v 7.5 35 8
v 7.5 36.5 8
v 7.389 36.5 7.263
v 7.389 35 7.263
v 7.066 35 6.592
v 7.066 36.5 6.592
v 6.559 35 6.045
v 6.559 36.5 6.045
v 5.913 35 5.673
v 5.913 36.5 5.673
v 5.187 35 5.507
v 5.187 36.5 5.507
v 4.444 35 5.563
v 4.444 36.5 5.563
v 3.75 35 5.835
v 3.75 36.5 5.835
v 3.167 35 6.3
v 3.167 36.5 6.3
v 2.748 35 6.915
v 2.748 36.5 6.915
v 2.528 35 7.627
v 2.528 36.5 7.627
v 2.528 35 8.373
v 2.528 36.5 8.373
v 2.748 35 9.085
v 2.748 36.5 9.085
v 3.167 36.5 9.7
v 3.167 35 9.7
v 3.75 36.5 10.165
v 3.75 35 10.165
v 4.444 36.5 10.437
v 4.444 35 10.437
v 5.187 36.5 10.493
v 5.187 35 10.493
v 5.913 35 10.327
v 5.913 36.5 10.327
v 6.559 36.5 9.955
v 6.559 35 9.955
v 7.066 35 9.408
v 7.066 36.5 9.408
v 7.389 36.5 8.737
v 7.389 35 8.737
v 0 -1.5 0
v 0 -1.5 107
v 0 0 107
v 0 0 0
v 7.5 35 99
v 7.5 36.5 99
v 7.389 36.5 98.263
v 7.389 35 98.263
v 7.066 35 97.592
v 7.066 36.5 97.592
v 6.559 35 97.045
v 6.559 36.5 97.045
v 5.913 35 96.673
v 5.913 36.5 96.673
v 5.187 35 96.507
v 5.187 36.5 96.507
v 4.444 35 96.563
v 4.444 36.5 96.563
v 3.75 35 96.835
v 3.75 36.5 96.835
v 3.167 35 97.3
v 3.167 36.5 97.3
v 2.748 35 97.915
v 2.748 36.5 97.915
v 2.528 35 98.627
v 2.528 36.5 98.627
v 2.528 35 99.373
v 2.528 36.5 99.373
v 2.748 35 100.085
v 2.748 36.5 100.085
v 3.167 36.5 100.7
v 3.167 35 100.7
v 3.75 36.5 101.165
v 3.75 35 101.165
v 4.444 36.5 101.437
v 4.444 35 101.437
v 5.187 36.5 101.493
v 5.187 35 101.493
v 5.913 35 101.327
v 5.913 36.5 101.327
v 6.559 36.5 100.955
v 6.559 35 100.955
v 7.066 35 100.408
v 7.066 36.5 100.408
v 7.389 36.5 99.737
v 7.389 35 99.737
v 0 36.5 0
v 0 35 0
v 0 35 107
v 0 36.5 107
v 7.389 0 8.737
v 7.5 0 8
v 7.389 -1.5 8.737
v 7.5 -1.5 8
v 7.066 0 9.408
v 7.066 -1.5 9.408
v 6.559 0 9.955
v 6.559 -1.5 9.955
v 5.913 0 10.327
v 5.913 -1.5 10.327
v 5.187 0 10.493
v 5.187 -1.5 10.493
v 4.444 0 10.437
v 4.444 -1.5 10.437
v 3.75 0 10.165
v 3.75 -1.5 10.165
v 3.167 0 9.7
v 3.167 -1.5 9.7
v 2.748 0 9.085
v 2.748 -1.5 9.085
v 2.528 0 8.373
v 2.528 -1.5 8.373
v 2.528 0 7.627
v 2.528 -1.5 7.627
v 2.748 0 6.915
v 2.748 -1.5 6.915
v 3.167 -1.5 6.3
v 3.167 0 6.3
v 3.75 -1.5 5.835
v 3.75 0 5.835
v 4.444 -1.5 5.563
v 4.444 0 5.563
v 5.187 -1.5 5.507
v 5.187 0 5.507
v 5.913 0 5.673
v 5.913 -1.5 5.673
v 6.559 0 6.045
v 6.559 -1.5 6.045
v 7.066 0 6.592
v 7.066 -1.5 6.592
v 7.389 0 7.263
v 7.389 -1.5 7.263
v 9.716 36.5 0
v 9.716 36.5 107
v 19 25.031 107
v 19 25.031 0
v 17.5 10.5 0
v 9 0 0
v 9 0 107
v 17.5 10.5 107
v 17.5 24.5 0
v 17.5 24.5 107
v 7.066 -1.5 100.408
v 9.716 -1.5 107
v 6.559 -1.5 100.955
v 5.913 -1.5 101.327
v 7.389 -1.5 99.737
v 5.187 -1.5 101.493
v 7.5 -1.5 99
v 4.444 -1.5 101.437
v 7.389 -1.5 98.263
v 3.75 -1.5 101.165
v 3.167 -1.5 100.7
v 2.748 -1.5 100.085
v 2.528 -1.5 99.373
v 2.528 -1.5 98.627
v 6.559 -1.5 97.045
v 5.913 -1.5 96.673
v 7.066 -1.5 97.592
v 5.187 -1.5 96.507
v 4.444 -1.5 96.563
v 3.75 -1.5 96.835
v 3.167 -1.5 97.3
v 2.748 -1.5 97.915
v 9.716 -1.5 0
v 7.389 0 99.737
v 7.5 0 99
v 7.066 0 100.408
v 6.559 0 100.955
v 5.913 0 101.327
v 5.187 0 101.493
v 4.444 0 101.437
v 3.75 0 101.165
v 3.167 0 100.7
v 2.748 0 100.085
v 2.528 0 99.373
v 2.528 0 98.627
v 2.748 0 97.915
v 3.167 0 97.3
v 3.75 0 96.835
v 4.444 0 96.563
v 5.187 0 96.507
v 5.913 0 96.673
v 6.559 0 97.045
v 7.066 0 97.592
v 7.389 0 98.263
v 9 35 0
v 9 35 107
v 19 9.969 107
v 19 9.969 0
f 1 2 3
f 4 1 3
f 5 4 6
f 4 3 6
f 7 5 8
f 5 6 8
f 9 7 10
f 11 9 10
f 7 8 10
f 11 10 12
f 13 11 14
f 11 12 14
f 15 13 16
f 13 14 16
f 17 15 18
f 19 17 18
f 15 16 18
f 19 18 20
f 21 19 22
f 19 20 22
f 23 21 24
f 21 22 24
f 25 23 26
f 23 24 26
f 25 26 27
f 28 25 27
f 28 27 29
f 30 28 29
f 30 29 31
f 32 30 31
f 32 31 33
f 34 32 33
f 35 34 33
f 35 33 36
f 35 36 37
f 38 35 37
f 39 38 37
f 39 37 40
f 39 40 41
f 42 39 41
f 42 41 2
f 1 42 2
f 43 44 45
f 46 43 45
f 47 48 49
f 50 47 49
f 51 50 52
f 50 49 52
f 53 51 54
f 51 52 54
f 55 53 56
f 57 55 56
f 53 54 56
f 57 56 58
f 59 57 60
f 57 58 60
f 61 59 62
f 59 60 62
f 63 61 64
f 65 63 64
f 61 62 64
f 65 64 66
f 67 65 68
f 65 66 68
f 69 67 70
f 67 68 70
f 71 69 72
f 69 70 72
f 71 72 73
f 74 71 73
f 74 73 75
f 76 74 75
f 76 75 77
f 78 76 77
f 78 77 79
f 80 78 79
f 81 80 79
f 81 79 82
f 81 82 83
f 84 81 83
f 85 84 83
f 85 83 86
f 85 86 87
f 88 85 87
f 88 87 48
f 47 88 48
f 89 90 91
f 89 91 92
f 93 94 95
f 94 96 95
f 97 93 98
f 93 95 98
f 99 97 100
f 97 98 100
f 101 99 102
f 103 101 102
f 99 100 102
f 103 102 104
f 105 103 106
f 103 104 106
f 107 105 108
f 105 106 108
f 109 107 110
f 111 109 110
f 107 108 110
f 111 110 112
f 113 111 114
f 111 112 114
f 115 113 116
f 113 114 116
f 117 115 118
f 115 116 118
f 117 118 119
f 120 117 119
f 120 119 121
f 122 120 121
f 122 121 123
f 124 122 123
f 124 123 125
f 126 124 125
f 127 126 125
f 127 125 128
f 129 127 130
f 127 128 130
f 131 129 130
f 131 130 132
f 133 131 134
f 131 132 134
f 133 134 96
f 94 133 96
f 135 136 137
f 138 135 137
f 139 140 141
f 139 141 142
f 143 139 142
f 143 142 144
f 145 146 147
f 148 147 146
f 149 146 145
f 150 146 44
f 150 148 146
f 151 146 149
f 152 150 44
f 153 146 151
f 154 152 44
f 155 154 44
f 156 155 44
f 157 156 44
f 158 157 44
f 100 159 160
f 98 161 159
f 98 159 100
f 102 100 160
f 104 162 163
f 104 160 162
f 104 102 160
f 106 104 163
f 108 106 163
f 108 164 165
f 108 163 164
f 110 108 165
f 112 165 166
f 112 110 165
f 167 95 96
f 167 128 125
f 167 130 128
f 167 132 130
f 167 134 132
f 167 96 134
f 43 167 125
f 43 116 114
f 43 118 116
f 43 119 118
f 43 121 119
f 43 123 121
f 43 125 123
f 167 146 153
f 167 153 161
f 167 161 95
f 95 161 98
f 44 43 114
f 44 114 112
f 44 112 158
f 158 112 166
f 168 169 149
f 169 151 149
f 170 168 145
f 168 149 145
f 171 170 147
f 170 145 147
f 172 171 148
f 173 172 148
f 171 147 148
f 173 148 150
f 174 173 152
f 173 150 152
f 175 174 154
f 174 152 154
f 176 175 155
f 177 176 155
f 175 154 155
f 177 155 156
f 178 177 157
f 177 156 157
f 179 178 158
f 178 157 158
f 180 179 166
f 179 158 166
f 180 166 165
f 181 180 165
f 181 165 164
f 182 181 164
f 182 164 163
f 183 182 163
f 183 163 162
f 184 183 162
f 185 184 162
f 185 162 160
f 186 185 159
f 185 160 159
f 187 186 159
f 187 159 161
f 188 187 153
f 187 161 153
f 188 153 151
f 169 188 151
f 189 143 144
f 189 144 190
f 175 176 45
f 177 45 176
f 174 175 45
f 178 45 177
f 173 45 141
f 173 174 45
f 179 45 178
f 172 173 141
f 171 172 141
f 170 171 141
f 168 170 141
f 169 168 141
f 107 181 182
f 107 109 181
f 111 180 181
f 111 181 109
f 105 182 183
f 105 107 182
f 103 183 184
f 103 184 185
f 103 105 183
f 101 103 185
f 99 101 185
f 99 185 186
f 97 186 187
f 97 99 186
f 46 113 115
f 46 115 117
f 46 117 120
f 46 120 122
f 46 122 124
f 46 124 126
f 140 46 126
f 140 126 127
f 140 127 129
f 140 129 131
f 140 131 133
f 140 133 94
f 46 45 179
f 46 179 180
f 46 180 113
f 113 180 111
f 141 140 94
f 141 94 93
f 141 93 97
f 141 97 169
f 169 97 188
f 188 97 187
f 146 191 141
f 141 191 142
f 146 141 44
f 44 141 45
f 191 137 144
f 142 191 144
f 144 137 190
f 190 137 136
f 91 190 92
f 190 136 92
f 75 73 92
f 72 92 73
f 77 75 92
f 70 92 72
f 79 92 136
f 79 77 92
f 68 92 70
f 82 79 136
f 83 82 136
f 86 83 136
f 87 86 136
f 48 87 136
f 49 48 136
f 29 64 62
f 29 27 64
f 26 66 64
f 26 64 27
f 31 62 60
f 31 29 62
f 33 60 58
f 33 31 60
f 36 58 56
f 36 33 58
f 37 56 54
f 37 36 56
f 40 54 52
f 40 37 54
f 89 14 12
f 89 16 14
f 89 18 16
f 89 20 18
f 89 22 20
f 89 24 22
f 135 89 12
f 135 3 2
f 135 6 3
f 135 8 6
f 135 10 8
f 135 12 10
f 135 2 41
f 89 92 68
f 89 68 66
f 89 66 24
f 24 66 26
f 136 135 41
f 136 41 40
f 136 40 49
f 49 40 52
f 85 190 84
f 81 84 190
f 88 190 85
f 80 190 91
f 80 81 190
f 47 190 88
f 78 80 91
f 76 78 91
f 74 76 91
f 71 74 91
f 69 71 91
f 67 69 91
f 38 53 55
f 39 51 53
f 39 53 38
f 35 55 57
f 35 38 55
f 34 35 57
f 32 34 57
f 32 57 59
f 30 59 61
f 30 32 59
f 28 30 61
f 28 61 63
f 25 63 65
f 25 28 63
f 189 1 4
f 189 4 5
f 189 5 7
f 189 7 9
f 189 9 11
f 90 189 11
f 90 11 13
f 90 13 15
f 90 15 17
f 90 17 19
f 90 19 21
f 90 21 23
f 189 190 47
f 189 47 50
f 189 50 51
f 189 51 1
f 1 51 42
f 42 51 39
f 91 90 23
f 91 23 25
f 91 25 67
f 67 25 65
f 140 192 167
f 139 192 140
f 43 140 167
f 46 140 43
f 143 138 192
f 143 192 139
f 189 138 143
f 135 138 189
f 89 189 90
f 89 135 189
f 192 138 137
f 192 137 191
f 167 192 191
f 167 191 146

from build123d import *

# Parameters (mm, degrees)
SALIENTE_EXTRUIR1_DEPTH = 107
CORTAR_EXTRUIR1_REACH   = 40
CROQUIS3_R              = 2.5
CORTAR_EXTRUIR2_REACH   = 40
CROQUIS4_R              = 2.5


with BuildPart() as part:
    # Croquis1 → Saliente-Extruir1 (new body)
    with BuildSketch(Plane.XY):
        Polygon((0, 0), (9, 0), (17.5, 10.5), (17.5, 24.5), (9, 35), (0, 35), (0, 36.5), (9.715608012, 36.5), (19, 25.031045192), (19, 9.968954808), (9.715608012, -1.5), (0, -1.5), align=None)
    extrude(amount=SALIENTE_EXTRUIR1_DEPTH)

    # Croquis3 → Cortar-Extruir1 (cut, up to next)
    with BuildSketch(Plane(origin=(0, 36.5, 0), x_dir=(1, 0, 0), z_dir=(0, 1, 0)), mode=Mode.PRIVATE) as cortar_extruir1_sk1:
        with Locations((5, -8)):
            Circle(CROQUIS3_R)
    cortar_extruir1_tool1 = extrude(cortar_extruir1_sk1.sketch, amount=-CORTAR_EXTRUIR1_REACH, mode=Mode.PRIVATE) & part.part
    add(cortar_extruir1_tool1.solids().sort_by_distance((5, 36.5, 8))[0], mode=Mode.SUBTRACT)
    # Croquis3 → Cortar-Extruir1 (cut, up to next)
    with BuildSketch(Plane(origin=(0, 36.5, 0), x_dir=(1, 0, 0), z_dir=(0, 1, 0)), mode=Mode.PRIVATE) as cortar_extruir1_sk2:
        with Locations((5, -99)):
            Circle(CROQUIS3_R)
    cortar_extruir1_tool2 = extrude(cortar_extruir1_sk2.sketch, amount=-CORTAR_EXTRUIR1_REACH, mode=Mode.PRIVATE) & part.part
    add(cortar_extruir1_tool2.solids().sort_by_distance((5, 36.5, 99))[0], mode=Mode.SUBTRACT)

    # Croquis4 → Cortar-Extruir2 (cut, up to next)
    with BuildSketch(Plane.XZ.offset(1.5), mode=Mode.PRIVATE) as cortar_extruir2_sk1:
        with Locations((5, 8)):
            Circle(CROQUIS4_R)
    cortar_extruir2_tool1 = extrude(cortar_extruir2_sk1.sketch, amount=-CORTAR_EXTRUIR2_REACH, mode=Mode.PRIVATE) & part.part
    add(cortar_extruir2_tool1.solids().sort_by_distance((5, -1.5, 8))[0], mode=Mode.SUBTRACT)
    # Croquis4 → Cortar-Extruir2 (cut, up to next)
    with BuildSketch(Plane.XZ.offset(1.5), mode=Mode.PRIVATE) as cortar_extruir2_sk2:
        with Locations((5, 99)):
            Circle(CROQUIS4_R)
    cortar_extruir2_tool2 = extrude(cortar_extruir2_sk2.sketch, amount=-CORTAR_EXTRUIR2_REACH, mode=Mode.PRIVATE) & part.part
    add(cortar_extruir2_tool2.solids().sort_by_distance((5, -1.5, 99))[0], mode=Mode.SUBTRACT)


solid = part.part
